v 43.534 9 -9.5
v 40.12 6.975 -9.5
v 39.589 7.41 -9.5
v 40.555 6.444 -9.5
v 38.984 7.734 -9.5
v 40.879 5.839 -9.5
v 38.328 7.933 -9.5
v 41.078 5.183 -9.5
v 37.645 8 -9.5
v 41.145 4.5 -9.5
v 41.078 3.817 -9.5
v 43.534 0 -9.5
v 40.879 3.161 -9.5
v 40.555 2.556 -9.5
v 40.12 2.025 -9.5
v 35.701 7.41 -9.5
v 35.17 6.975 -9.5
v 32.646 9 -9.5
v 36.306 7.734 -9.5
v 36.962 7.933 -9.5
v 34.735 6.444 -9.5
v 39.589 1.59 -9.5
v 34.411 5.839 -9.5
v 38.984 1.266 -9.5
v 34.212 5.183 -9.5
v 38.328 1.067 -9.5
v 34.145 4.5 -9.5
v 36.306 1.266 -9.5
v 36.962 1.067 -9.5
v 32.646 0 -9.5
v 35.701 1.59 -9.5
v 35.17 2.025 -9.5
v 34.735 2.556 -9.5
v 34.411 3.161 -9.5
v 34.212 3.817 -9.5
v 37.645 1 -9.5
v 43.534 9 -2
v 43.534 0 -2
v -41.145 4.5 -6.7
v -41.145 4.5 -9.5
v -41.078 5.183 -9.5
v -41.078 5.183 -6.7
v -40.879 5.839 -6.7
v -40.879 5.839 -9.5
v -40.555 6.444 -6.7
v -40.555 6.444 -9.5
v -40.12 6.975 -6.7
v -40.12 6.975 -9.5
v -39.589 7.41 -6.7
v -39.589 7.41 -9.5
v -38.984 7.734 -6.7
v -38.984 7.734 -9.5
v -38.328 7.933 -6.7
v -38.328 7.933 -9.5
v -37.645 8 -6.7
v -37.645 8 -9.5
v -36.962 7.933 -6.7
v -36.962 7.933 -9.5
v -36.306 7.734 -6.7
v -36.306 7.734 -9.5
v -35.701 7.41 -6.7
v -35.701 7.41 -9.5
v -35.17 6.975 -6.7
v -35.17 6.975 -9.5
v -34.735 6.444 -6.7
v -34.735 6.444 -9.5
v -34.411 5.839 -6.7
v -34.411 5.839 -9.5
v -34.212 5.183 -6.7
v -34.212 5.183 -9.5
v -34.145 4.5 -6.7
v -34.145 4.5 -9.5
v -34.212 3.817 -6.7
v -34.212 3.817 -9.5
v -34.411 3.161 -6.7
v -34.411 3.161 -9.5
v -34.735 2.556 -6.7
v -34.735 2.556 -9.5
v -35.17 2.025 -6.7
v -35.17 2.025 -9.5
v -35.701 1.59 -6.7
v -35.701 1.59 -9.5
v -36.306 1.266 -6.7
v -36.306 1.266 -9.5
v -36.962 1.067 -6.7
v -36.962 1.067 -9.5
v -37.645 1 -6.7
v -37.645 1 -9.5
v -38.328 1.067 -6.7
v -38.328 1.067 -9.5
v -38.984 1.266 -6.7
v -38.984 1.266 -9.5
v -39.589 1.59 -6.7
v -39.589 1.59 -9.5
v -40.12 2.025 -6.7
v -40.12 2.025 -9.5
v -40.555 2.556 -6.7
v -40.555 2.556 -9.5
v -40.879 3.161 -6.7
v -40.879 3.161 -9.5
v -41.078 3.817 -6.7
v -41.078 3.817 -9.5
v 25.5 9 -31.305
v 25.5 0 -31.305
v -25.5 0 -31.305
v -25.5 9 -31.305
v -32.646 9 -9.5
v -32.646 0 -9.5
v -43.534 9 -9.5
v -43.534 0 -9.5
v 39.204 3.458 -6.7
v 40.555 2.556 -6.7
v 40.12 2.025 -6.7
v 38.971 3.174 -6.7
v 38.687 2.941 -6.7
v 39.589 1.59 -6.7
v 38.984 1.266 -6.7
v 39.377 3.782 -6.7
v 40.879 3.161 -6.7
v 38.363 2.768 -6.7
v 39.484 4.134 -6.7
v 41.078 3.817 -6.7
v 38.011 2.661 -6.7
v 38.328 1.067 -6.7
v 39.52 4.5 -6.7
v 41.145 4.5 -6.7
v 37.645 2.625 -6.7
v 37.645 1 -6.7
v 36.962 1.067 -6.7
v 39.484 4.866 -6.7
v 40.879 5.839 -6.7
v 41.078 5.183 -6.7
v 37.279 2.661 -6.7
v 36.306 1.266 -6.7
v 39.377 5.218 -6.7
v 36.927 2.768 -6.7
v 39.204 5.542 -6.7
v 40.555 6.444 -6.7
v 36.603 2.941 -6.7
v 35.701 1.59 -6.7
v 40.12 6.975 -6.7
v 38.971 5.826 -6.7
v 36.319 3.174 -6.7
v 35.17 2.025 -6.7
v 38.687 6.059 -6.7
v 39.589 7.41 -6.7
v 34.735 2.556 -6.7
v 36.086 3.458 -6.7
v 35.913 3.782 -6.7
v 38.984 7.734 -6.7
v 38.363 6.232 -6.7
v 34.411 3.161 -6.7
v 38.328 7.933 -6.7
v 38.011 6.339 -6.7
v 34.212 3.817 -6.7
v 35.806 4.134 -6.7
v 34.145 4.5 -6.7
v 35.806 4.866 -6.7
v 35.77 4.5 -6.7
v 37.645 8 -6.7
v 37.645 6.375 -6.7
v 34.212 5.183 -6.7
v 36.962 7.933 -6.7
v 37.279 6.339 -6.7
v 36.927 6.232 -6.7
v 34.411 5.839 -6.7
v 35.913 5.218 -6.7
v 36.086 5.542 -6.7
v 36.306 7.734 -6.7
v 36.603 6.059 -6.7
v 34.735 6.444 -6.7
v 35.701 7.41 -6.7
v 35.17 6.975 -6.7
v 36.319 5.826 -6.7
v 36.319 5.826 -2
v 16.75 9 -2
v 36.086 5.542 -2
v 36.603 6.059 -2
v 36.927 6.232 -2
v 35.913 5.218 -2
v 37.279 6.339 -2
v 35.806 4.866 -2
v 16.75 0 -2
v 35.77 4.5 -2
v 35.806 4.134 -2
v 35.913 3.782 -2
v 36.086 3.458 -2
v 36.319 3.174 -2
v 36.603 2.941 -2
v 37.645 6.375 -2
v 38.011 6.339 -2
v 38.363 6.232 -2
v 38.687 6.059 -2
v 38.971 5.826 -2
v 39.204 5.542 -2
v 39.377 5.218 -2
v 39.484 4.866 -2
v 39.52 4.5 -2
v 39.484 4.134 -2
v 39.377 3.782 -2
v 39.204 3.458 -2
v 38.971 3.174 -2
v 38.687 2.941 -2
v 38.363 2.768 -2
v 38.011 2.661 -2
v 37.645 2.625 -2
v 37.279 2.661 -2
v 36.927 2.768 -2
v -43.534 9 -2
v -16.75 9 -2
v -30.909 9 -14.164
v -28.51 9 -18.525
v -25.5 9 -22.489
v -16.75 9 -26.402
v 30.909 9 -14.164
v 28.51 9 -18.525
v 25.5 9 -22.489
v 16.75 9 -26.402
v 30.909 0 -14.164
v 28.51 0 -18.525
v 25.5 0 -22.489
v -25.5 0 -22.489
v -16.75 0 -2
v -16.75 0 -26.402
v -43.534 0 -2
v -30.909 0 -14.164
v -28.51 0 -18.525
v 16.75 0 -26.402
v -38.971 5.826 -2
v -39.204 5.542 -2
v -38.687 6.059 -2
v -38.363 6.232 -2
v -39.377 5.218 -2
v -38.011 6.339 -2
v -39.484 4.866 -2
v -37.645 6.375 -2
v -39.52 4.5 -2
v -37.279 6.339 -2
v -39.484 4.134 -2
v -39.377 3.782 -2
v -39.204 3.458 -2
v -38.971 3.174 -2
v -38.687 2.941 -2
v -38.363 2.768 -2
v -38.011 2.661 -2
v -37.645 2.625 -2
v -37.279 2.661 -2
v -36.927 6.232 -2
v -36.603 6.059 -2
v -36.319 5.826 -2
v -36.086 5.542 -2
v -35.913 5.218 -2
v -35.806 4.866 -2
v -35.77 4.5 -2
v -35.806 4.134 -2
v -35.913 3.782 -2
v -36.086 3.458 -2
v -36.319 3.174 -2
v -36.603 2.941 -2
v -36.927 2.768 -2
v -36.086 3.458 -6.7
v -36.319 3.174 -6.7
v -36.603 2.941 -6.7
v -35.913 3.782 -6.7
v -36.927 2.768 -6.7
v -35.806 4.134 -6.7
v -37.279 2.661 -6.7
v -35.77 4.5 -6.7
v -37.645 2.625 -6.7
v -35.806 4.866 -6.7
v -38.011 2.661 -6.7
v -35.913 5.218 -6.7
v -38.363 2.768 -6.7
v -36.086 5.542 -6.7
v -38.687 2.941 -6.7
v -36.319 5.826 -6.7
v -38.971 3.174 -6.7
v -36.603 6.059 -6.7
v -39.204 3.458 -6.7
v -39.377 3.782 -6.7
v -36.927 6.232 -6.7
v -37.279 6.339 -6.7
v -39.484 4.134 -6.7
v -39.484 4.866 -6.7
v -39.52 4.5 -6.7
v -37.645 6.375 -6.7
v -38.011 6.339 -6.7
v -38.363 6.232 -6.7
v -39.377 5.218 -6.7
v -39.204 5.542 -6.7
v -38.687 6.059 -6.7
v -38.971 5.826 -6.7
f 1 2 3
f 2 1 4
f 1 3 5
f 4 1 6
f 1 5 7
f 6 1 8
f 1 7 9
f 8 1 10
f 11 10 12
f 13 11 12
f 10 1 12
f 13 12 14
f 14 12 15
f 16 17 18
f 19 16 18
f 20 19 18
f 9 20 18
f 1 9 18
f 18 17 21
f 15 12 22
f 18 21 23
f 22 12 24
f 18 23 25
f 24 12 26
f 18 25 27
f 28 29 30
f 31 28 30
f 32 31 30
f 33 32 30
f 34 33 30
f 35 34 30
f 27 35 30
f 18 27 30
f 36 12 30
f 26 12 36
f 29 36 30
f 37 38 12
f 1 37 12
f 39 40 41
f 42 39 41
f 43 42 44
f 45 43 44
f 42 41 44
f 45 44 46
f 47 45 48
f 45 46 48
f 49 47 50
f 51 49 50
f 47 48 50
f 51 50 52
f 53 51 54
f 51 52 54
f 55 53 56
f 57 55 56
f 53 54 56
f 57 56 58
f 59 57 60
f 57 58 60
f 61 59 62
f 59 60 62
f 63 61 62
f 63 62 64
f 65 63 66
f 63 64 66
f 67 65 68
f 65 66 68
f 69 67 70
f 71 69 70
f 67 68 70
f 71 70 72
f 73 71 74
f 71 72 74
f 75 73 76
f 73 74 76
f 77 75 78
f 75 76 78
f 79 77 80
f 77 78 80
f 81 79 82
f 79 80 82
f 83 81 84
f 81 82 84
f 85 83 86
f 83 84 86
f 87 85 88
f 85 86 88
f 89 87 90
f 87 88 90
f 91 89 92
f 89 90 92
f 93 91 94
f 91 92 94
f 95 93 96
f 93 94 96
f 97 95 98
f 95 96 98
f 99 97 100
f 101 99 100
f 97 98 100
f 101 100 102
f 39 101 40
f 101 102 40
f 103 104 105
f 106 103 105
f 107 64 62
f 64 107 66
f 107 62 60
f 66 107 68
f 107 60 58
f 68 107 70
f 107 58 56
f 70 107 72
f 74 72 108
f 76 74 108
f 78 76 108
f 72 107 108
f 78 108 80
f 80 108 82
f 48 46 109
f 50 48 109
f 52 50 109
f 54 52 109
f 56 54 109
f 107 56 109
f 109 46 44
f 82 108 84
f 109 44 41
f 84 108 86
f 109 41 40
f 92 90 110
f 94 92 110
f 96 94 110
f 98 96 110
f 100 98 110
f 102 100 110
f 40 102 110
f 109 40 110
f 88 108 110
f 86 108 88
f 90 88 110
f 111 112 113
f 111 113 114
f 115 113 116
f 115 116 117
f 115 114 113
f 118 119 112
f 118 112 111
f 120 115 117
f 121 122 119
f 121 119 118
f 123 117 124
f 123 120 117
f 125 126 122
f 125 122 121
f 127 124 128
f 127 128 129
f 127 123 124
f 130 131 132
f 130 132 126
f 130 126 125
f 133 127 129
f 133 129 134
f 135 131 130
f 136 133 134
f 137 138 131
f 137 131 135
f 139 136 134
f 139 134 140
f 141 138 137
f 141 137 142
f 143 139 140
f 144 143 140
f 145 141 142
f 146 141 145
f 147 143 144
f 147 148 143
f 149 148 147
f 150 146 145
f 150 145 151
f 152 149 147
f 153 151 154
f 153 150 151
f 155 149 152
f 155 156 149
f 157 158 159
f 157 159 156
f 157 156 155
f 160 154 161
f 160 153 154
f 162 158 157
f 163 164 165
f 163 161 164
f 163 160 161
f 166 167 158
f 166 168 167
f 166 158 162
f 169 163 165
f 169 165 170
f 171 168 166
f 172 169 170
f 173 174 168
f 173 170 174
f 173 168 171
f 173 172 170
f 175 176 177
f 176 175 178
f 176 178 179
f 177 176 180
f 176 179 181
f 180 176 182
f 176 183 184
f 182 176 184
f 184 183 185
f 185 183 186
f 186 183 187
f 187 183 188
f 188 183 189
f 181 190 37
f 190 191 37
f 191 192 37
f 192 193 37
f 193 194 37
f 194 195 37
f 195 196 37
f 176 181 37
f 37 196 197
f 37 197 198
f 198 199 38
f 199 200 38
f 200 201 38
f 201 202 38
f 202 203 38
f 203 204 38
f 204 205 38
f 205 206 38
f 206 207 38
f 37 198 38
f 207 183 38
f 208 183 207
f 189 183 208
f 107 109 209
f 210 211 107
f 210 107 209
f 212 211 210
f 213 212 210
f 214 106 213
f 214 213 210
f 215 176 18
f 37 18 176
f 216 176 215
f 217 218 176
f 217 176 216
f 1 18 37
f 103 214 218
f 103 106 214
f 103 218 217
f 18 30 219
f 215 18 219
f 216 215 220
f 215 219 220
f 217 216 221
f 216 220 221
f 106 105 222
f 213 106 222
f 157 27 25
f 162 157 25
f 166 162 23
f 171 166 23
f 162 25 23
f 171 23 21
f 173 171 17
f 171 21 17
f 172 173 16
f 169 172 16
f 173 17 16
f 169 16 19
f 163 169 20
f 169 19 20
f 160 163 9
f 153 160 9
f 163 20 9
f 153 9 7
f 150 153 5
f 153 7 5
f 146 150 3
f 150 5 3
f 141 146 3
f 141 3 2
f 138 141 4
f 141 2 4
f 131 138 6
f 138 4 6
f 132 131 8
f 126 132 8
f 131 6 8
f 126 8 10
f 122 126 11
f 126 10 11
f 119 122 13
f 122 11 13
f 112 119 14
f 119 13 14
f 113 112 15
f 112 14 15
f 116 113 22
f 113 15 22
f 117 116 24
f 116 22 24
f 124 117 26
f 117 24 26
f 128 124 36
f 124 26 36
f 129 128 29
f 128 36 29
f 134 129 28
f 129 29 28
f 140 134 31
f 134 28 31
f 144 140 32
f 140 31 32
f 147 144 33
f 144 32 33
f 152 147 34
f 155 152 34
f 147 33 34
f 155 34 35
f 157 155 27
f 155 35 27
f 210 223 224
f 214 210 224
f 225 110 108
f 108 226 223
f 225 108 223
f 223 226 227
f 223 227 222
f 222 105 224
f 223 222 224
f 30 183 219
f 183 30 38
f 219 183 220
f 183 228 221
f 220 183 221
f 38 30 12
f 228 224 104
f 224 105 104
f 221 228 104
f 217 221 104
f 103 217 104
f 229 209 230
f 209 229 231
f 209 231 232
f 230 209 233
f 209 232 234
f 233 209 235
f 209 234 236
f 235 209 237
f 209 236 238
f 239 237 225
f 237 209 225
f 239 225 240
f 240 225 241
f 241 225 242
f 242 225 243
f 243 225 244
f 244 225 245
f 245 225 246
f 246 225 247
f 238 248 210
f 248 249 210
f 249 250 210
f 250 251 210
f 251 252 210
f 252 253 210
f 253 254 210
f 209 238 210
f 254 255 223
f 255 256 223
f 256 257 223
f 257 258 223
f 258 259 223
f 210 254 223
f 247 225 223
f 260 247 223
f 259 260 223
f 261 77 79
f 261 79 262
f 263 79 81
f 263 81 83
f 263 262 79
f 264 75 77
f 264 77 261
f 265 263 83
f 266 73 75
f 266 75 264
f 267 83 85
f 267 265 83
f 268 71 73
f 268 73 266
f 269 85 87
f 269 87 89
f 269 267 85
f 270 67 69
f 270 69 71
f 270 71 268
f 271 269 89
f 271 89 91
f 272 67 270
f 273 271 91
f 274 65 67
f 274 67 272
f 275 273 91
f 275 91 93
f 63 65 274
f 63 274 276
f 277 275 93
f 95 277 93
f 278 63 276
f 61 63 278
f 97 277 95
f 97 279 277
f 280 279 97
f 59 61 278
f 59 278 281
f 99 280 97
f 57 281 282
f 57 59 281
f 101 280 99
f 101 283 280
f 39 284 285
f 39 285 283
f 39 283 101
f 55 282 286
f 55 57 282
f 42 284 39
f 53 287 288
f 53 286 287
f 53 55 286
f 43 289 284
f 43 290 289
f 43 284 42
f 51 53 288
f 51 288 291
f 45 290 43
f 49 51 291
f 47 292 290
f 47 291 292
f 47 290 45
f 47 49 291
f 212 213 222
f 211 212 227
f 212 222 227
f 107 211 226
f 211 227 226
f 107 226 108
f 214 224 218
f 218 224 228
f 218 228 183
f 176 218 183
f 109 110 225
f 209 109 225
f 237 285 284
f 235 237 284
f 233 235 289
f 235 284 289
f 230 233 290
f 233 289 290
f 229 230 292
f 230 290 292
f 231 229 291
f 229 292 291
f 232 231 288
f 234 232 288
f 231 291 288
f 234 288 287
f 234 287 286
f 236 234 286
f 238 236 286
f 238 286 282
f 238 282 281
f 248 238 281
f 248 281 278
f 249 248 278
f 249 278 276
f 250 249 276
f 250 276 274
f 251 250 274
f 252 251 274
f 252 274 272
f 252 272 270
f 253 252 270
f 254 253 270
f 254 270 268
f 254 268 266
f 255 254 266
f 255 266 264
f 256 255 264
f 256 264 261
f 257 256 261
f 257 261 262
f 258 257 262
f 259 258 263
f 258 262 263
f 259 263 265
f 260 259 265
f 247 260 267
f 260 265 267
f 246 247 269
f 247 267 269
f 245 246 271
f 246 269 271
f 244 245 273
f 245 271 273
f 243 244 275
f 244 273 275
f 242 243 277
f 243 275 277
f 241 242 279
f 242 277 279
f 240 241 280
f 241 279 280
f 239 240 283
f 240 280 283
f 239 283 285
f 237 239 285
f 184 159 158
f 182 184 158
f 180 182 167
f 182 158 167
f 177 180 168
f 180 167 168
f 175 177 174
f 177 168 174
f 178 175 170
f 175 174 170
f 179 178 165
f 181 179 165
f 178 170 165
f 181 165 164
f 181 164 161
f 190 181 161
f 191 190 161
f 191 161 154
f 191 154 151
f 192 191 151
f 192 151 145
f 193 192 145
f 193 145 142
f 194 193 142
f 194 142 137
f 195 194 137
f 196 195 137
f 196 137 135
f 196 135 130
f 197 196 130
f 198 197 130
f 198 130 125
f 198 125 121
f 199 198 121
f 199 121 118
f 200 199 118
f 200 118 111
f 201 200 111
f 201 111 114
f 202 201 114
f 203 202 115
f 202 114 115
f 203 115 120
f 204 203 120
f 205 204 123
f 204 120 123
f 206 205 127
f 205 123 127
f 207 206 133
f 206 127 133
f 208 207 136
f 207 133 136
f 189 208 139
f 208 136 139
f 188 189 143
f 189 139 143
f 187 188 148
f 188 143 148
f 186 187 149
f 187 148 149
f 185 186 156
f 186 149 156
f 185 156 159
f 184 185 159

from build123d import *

# Parameters (mm, degrees)
SALIENTE_EXTRUIR1_DEPTH = 9
CROQUIS2_R              = 1.875
CORTAR_EXTRUIR1_DEPTH   = 50.514508735
CROQUIS2_3_R            = 3.5
CROQUIS2_3_R_2          = 1.875
CORTAR_EXTRUIR2_DEPTH   = 2.8


with BuildPart() as part:
    # Croquis1 → Saliente-Extruir1 (new body)
    with BuildSketch(Plane(origin=(0, 0, 0), x_dir=(1, 0, 0), z_dir=(0, 1, 0))):
        with BuildLine():
            Line((16.75, 2), (25.53429067, 2))
            Line((25.53429067, 2), (43.53429067, 2))
            Line((43.53429067, 2), (43.53429067, 9.5))
            Line((43.53429067, 9.5), (32.645826686, 9.5))
            ThreePointArc((32.645826686, 9.5), (29.789462584, 16.388652139), (25.5, 22.488886144))
            Line((25.5, 22.488886144), (25.5, 31.304864393))
            Line((25.5, 31.304864393), (-25.5, 31.304864393))
            Line((-25.5, 31.304864393), (-25.5, 22.488886144))
            ThreePointArc((-25.5, 22.488886144), (-29.789462584, 16.388652139), (-32.645826686, 9.5))
            Line((-32.645826686, 9.5), (-43.53429067, 9.5))
            Line((-43.53429067, 9.5), (-43.53429067, 2))
            Line((-43.53429067, 2), (-25.53429067, 2))
            Line((-25.53429067, 2), (-16.75, 2))
            Line((-16.75, 2), (-16.75, 26.402432196))
            Line((-16.75, 26.402432196), (16.75, 26.402432196))
            Line((16.75, 26.402432196), (16.75, 2))
        make_face()
    extrude(amount=SALIENTE_EXTRUIR1_DEPTH)

    # Croquis2 → Cortar-Extruir1 (cut, through all)
    with BuildSketch(Plane(origin=(0, 0, -9.5), x_dir=(-1, 0, 0), z_dir=(0, 0, -1))):
        with Locations((-37.645, 4.5)):
            Circle(CROQUIS2_R)
        with Locations((37.645, 4.5)):
            Circle(CROQUIS2_R)
    extrude(amount=-CORTAR_EXTRUIR1_DEPTH, mode=Mode.SUBTRACT)

    # Croquis2<3> → Cortar-Extruir2 (cut)
    # profile 1 of 2: a face of its own
    with BuildSketch(Plane(origin=(0, 0, -9.5), x_dir=(-1, 0, 0), z_dir=(0, 0, -1))):
        with Locations((-37.645, 4.5)):
            Circle(CROQUIS2_3_R)
        with Locations((-37.645, 4.5)):
            Circle(CROQUIS2_3_R_2, mode=Mode.SUBTRACT)
    # profile 2 of 2: a face of its own
    with BuildSketch(Plane(origin=(0, 0, -9.5), x_dir=(-1, 0, 0), z_dir=(0, 0, -1))):
        with Locations((37.645, 4.5)):
            Circle(CROQUIS2_3_R)
        with Locations((37.645, 4.5)):
            Circle(CROQUIS2_3_R_2, mode=Mode.SUBTRACT)
    extrude(amount=-CORTAR_EXTRUIR2_DEPTH, mode=Mode.SUBTRACT)


solid = part.part
